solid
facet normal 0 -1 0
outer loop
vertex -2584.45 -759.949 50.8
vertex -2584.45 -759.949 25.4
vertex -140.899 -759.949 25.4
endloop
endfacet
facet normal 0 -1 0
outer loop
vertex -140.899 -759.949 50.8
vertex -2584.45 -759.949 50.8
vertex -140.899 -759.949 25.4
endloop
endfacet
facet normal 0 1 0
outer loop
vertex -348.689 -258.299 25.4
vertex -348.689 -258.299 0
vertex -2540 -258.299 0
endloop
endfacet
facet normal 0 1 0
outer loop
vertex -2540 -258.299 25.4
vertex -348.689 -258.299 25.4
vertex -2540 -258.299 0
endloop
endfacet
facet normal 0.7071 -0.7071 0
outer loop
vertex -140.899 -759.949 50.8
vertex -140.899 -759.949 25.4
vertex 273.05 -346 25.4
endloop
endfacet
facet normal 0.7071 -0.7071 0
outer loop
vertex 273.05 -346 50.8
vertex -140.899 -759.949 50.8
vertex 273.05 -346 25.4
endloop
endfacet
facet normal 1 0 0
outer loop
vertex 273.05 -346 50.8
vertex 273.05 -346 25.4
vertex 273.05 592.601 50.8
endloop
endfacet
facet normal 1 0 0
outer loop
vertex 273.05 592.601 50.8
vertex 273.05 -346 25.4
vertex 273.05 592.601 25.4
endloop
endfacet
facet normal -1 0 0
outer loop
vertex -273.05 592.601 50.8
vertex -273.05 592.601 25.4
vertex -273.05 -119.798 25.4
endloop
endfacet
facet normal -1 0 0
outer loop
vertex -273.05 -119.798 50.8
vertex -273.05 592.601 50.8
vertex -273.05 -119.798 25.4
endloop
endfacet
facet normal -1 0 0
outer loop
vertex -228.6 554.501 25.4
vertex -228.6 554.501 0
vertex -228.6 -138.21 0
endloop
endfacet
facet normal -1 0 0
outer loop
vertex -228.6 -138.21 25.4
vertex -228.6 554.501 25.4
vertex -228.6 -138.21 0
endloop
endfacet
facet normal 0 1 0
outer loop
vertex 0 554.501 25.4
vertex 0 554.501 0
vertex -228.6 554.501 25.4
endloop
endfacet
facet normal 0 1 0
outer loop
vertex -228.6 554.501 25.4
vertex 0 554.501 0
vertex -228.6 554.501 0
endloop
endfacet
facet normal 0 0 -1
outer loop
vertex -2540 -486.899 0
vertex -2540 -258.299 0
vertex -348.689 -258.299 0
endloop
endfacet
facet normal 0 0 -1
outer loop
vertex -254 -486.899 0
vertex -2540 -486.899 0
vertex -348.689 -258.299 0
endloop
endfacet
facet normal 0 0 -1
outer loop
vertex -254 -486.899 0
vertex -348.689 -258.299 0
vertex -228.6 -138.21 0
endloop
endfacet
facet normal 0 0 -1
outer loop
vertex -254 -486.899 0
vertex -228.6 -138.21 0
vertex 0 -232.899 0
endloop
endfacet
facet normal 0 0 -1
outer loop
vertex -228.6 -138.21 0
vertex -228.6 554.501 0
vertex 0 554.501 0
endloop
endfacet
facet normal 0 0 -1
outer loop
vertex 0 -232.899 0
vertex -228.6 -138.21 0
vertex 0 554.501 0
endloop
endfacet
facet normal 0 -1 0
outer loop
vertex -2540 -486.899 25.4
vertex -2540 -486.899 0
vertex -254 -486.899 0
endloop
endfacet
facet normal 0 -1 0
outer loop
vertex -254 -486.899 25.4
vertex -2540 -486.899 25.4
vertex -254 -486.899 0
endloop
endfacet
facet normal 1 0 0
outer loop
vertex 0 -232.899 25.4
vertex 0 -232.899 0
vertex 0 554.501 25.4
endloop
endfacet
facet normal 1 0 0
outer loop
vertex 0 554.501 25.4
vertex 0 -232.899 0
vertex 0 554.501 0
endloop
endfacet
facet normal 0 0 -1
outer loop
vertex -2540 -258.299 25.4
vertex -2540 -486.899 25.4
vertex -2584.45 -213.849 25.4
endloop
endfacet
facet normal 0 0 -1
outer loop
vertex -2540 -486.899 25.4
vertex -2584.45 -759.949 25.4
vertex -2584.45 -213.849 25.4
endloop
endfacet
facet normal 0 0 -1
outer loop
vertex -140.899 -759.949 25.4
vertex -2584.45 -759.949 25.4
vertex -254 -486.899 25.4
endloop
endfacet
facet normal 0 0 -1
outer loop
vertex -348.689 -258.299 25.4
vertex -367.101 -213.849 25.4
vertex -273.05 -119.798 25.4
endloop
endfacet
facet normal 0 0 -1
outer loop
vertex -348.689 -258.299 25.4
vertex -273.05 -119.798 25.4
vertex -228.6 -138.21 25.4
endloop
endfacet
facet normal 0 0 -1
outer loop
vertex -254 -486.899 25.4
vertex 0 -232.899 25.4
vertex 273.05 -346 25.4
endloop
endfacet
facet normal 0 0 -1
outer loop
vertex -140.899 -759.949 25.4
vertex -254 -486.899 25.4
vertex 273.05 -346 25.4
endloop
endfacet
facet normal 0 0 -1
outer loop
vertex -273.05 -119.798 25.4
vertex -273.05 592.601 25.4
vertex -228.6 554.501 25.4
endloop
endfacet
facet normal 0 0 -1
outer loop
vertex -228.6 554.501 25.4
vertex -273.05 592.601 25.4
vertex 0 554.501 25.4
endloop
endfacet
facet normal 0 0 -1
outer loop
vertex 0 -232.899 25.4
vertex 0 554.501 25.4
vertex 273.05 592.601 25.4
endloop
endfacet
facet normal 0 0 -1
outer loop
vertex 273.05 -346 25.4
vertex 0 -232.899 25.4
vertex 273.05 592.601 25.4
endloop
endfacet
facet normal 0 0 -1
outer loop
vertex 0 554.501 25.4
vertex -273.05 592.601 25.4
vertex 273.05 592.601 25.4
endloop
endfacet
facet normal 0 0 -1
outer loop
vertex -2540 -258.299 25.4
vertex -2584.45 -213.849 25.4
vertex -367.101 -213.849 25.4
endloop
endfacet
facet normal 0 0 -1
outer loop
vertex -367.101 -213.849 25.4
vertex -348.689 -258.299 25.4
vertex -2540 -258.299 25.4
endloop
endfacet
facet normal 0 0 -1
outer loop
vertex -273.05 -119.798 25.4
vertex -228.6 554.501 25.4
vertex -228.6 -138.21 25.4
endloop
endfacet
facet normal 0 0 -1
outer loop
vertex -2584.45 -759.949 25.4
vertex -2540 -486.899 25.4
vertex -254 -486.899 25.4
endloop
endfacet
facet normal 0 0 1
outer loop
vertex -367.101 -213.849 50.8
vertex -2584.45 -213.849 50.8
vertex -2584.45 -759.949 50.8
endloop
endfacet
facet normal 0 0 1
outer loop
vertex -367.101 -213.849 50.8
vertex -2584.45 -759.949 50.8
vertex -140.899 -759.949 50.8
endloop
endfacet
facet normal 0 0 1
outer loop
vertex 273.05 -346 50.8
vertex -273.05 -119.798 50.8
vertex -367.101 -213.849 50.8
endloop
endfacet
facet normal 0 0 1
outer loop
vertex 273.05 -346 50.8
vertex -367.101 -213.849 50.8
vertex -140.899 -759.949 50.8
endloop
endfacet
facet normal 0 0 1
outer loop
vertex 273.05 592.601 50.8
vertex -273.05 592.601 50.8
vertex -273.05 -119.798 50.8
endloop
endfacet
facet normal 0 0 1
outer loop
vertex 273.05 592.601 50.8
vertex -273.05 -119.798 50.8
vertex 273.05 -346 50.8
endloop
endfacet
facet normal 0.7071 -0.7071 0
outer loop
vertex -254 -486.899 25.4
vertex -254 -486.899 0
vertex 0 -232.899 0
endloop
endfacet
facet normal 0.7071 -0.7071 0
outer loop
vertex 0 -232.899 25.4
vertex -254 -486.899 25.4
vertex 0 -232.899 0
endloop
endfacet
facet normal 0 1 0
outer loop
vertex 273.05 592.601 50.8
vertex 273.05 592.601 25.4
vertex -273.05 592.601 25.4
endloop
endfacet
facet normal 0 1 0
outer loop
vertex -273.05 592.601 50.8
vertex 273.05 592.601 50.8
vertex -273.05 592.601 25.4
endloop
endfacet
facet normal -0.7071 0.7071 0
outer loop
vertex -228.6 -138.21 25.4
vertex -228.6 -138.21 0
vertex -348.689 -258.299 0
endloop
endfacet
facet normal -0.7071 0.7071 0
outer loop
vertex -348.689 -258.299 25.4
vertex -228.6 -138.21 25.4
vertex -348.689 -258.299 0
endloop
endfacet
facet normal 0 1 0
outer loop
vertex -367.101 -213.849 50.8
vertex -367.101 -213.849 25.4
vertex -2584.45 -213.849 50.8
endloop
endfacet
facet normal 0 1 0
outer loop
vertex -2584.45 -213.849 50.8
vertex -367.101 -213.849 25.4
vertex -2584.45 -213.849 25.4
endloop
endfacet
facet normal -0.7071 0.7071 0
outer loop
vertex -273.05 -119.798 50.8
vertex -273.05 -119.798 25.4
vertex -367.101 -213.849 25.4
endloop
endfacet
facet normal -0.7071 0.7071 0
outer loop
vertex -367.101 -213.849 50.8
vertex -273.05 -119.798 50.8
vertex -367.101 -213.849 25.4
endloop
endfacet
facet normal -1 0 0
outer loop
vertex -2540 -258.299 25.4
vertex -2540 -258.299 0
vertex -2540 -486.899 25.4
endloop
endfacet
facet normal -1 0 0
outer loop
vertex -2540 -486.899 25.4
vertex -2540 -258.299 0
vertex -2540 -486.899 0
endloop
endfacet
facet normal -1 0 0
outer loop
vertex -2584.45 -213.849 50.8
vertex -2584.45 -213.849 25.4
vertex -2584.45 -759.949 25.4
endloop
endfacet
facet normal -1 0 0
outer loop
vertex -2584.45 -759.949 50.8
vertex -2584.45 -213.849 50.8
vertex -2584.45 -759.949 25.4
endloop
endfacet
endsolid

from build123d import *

# Parameters (mm, degrees)
F1_DEPTH = 25.4
F3_DEPTH = 25.4


with BuildPart() as f1:
    # F0 (on Top) → F1 (new body)
    with BuildSketch(Plane.XY):
        Polygon((-2540, -258.299129), (-2540, -486.899129), (-254, -486.899129), (0, -232.899129), (0, 554.500871), (-228.6, 554.500871), (-228.6, -138.209909), (-348.68922, -258.299129), align=None)
    extrude(amount=F1_DEPTH)

    # F2 (on face) → F3 (join)
    with BuildSketch(Plane.XY.offset(25.4)):
        Polygon((-367.101013, -213.849129), (-2584.45, -213.849129), (-2584.45, -759.949129), (-140.898987, -759.949129), (273.05, -346.000142), (273.05, 592.600871), (-273.05, 592.600871), (-273.05, -119.798116), align=None)
    extrude(amount=F3_DEPTH)


solid = f1.part
